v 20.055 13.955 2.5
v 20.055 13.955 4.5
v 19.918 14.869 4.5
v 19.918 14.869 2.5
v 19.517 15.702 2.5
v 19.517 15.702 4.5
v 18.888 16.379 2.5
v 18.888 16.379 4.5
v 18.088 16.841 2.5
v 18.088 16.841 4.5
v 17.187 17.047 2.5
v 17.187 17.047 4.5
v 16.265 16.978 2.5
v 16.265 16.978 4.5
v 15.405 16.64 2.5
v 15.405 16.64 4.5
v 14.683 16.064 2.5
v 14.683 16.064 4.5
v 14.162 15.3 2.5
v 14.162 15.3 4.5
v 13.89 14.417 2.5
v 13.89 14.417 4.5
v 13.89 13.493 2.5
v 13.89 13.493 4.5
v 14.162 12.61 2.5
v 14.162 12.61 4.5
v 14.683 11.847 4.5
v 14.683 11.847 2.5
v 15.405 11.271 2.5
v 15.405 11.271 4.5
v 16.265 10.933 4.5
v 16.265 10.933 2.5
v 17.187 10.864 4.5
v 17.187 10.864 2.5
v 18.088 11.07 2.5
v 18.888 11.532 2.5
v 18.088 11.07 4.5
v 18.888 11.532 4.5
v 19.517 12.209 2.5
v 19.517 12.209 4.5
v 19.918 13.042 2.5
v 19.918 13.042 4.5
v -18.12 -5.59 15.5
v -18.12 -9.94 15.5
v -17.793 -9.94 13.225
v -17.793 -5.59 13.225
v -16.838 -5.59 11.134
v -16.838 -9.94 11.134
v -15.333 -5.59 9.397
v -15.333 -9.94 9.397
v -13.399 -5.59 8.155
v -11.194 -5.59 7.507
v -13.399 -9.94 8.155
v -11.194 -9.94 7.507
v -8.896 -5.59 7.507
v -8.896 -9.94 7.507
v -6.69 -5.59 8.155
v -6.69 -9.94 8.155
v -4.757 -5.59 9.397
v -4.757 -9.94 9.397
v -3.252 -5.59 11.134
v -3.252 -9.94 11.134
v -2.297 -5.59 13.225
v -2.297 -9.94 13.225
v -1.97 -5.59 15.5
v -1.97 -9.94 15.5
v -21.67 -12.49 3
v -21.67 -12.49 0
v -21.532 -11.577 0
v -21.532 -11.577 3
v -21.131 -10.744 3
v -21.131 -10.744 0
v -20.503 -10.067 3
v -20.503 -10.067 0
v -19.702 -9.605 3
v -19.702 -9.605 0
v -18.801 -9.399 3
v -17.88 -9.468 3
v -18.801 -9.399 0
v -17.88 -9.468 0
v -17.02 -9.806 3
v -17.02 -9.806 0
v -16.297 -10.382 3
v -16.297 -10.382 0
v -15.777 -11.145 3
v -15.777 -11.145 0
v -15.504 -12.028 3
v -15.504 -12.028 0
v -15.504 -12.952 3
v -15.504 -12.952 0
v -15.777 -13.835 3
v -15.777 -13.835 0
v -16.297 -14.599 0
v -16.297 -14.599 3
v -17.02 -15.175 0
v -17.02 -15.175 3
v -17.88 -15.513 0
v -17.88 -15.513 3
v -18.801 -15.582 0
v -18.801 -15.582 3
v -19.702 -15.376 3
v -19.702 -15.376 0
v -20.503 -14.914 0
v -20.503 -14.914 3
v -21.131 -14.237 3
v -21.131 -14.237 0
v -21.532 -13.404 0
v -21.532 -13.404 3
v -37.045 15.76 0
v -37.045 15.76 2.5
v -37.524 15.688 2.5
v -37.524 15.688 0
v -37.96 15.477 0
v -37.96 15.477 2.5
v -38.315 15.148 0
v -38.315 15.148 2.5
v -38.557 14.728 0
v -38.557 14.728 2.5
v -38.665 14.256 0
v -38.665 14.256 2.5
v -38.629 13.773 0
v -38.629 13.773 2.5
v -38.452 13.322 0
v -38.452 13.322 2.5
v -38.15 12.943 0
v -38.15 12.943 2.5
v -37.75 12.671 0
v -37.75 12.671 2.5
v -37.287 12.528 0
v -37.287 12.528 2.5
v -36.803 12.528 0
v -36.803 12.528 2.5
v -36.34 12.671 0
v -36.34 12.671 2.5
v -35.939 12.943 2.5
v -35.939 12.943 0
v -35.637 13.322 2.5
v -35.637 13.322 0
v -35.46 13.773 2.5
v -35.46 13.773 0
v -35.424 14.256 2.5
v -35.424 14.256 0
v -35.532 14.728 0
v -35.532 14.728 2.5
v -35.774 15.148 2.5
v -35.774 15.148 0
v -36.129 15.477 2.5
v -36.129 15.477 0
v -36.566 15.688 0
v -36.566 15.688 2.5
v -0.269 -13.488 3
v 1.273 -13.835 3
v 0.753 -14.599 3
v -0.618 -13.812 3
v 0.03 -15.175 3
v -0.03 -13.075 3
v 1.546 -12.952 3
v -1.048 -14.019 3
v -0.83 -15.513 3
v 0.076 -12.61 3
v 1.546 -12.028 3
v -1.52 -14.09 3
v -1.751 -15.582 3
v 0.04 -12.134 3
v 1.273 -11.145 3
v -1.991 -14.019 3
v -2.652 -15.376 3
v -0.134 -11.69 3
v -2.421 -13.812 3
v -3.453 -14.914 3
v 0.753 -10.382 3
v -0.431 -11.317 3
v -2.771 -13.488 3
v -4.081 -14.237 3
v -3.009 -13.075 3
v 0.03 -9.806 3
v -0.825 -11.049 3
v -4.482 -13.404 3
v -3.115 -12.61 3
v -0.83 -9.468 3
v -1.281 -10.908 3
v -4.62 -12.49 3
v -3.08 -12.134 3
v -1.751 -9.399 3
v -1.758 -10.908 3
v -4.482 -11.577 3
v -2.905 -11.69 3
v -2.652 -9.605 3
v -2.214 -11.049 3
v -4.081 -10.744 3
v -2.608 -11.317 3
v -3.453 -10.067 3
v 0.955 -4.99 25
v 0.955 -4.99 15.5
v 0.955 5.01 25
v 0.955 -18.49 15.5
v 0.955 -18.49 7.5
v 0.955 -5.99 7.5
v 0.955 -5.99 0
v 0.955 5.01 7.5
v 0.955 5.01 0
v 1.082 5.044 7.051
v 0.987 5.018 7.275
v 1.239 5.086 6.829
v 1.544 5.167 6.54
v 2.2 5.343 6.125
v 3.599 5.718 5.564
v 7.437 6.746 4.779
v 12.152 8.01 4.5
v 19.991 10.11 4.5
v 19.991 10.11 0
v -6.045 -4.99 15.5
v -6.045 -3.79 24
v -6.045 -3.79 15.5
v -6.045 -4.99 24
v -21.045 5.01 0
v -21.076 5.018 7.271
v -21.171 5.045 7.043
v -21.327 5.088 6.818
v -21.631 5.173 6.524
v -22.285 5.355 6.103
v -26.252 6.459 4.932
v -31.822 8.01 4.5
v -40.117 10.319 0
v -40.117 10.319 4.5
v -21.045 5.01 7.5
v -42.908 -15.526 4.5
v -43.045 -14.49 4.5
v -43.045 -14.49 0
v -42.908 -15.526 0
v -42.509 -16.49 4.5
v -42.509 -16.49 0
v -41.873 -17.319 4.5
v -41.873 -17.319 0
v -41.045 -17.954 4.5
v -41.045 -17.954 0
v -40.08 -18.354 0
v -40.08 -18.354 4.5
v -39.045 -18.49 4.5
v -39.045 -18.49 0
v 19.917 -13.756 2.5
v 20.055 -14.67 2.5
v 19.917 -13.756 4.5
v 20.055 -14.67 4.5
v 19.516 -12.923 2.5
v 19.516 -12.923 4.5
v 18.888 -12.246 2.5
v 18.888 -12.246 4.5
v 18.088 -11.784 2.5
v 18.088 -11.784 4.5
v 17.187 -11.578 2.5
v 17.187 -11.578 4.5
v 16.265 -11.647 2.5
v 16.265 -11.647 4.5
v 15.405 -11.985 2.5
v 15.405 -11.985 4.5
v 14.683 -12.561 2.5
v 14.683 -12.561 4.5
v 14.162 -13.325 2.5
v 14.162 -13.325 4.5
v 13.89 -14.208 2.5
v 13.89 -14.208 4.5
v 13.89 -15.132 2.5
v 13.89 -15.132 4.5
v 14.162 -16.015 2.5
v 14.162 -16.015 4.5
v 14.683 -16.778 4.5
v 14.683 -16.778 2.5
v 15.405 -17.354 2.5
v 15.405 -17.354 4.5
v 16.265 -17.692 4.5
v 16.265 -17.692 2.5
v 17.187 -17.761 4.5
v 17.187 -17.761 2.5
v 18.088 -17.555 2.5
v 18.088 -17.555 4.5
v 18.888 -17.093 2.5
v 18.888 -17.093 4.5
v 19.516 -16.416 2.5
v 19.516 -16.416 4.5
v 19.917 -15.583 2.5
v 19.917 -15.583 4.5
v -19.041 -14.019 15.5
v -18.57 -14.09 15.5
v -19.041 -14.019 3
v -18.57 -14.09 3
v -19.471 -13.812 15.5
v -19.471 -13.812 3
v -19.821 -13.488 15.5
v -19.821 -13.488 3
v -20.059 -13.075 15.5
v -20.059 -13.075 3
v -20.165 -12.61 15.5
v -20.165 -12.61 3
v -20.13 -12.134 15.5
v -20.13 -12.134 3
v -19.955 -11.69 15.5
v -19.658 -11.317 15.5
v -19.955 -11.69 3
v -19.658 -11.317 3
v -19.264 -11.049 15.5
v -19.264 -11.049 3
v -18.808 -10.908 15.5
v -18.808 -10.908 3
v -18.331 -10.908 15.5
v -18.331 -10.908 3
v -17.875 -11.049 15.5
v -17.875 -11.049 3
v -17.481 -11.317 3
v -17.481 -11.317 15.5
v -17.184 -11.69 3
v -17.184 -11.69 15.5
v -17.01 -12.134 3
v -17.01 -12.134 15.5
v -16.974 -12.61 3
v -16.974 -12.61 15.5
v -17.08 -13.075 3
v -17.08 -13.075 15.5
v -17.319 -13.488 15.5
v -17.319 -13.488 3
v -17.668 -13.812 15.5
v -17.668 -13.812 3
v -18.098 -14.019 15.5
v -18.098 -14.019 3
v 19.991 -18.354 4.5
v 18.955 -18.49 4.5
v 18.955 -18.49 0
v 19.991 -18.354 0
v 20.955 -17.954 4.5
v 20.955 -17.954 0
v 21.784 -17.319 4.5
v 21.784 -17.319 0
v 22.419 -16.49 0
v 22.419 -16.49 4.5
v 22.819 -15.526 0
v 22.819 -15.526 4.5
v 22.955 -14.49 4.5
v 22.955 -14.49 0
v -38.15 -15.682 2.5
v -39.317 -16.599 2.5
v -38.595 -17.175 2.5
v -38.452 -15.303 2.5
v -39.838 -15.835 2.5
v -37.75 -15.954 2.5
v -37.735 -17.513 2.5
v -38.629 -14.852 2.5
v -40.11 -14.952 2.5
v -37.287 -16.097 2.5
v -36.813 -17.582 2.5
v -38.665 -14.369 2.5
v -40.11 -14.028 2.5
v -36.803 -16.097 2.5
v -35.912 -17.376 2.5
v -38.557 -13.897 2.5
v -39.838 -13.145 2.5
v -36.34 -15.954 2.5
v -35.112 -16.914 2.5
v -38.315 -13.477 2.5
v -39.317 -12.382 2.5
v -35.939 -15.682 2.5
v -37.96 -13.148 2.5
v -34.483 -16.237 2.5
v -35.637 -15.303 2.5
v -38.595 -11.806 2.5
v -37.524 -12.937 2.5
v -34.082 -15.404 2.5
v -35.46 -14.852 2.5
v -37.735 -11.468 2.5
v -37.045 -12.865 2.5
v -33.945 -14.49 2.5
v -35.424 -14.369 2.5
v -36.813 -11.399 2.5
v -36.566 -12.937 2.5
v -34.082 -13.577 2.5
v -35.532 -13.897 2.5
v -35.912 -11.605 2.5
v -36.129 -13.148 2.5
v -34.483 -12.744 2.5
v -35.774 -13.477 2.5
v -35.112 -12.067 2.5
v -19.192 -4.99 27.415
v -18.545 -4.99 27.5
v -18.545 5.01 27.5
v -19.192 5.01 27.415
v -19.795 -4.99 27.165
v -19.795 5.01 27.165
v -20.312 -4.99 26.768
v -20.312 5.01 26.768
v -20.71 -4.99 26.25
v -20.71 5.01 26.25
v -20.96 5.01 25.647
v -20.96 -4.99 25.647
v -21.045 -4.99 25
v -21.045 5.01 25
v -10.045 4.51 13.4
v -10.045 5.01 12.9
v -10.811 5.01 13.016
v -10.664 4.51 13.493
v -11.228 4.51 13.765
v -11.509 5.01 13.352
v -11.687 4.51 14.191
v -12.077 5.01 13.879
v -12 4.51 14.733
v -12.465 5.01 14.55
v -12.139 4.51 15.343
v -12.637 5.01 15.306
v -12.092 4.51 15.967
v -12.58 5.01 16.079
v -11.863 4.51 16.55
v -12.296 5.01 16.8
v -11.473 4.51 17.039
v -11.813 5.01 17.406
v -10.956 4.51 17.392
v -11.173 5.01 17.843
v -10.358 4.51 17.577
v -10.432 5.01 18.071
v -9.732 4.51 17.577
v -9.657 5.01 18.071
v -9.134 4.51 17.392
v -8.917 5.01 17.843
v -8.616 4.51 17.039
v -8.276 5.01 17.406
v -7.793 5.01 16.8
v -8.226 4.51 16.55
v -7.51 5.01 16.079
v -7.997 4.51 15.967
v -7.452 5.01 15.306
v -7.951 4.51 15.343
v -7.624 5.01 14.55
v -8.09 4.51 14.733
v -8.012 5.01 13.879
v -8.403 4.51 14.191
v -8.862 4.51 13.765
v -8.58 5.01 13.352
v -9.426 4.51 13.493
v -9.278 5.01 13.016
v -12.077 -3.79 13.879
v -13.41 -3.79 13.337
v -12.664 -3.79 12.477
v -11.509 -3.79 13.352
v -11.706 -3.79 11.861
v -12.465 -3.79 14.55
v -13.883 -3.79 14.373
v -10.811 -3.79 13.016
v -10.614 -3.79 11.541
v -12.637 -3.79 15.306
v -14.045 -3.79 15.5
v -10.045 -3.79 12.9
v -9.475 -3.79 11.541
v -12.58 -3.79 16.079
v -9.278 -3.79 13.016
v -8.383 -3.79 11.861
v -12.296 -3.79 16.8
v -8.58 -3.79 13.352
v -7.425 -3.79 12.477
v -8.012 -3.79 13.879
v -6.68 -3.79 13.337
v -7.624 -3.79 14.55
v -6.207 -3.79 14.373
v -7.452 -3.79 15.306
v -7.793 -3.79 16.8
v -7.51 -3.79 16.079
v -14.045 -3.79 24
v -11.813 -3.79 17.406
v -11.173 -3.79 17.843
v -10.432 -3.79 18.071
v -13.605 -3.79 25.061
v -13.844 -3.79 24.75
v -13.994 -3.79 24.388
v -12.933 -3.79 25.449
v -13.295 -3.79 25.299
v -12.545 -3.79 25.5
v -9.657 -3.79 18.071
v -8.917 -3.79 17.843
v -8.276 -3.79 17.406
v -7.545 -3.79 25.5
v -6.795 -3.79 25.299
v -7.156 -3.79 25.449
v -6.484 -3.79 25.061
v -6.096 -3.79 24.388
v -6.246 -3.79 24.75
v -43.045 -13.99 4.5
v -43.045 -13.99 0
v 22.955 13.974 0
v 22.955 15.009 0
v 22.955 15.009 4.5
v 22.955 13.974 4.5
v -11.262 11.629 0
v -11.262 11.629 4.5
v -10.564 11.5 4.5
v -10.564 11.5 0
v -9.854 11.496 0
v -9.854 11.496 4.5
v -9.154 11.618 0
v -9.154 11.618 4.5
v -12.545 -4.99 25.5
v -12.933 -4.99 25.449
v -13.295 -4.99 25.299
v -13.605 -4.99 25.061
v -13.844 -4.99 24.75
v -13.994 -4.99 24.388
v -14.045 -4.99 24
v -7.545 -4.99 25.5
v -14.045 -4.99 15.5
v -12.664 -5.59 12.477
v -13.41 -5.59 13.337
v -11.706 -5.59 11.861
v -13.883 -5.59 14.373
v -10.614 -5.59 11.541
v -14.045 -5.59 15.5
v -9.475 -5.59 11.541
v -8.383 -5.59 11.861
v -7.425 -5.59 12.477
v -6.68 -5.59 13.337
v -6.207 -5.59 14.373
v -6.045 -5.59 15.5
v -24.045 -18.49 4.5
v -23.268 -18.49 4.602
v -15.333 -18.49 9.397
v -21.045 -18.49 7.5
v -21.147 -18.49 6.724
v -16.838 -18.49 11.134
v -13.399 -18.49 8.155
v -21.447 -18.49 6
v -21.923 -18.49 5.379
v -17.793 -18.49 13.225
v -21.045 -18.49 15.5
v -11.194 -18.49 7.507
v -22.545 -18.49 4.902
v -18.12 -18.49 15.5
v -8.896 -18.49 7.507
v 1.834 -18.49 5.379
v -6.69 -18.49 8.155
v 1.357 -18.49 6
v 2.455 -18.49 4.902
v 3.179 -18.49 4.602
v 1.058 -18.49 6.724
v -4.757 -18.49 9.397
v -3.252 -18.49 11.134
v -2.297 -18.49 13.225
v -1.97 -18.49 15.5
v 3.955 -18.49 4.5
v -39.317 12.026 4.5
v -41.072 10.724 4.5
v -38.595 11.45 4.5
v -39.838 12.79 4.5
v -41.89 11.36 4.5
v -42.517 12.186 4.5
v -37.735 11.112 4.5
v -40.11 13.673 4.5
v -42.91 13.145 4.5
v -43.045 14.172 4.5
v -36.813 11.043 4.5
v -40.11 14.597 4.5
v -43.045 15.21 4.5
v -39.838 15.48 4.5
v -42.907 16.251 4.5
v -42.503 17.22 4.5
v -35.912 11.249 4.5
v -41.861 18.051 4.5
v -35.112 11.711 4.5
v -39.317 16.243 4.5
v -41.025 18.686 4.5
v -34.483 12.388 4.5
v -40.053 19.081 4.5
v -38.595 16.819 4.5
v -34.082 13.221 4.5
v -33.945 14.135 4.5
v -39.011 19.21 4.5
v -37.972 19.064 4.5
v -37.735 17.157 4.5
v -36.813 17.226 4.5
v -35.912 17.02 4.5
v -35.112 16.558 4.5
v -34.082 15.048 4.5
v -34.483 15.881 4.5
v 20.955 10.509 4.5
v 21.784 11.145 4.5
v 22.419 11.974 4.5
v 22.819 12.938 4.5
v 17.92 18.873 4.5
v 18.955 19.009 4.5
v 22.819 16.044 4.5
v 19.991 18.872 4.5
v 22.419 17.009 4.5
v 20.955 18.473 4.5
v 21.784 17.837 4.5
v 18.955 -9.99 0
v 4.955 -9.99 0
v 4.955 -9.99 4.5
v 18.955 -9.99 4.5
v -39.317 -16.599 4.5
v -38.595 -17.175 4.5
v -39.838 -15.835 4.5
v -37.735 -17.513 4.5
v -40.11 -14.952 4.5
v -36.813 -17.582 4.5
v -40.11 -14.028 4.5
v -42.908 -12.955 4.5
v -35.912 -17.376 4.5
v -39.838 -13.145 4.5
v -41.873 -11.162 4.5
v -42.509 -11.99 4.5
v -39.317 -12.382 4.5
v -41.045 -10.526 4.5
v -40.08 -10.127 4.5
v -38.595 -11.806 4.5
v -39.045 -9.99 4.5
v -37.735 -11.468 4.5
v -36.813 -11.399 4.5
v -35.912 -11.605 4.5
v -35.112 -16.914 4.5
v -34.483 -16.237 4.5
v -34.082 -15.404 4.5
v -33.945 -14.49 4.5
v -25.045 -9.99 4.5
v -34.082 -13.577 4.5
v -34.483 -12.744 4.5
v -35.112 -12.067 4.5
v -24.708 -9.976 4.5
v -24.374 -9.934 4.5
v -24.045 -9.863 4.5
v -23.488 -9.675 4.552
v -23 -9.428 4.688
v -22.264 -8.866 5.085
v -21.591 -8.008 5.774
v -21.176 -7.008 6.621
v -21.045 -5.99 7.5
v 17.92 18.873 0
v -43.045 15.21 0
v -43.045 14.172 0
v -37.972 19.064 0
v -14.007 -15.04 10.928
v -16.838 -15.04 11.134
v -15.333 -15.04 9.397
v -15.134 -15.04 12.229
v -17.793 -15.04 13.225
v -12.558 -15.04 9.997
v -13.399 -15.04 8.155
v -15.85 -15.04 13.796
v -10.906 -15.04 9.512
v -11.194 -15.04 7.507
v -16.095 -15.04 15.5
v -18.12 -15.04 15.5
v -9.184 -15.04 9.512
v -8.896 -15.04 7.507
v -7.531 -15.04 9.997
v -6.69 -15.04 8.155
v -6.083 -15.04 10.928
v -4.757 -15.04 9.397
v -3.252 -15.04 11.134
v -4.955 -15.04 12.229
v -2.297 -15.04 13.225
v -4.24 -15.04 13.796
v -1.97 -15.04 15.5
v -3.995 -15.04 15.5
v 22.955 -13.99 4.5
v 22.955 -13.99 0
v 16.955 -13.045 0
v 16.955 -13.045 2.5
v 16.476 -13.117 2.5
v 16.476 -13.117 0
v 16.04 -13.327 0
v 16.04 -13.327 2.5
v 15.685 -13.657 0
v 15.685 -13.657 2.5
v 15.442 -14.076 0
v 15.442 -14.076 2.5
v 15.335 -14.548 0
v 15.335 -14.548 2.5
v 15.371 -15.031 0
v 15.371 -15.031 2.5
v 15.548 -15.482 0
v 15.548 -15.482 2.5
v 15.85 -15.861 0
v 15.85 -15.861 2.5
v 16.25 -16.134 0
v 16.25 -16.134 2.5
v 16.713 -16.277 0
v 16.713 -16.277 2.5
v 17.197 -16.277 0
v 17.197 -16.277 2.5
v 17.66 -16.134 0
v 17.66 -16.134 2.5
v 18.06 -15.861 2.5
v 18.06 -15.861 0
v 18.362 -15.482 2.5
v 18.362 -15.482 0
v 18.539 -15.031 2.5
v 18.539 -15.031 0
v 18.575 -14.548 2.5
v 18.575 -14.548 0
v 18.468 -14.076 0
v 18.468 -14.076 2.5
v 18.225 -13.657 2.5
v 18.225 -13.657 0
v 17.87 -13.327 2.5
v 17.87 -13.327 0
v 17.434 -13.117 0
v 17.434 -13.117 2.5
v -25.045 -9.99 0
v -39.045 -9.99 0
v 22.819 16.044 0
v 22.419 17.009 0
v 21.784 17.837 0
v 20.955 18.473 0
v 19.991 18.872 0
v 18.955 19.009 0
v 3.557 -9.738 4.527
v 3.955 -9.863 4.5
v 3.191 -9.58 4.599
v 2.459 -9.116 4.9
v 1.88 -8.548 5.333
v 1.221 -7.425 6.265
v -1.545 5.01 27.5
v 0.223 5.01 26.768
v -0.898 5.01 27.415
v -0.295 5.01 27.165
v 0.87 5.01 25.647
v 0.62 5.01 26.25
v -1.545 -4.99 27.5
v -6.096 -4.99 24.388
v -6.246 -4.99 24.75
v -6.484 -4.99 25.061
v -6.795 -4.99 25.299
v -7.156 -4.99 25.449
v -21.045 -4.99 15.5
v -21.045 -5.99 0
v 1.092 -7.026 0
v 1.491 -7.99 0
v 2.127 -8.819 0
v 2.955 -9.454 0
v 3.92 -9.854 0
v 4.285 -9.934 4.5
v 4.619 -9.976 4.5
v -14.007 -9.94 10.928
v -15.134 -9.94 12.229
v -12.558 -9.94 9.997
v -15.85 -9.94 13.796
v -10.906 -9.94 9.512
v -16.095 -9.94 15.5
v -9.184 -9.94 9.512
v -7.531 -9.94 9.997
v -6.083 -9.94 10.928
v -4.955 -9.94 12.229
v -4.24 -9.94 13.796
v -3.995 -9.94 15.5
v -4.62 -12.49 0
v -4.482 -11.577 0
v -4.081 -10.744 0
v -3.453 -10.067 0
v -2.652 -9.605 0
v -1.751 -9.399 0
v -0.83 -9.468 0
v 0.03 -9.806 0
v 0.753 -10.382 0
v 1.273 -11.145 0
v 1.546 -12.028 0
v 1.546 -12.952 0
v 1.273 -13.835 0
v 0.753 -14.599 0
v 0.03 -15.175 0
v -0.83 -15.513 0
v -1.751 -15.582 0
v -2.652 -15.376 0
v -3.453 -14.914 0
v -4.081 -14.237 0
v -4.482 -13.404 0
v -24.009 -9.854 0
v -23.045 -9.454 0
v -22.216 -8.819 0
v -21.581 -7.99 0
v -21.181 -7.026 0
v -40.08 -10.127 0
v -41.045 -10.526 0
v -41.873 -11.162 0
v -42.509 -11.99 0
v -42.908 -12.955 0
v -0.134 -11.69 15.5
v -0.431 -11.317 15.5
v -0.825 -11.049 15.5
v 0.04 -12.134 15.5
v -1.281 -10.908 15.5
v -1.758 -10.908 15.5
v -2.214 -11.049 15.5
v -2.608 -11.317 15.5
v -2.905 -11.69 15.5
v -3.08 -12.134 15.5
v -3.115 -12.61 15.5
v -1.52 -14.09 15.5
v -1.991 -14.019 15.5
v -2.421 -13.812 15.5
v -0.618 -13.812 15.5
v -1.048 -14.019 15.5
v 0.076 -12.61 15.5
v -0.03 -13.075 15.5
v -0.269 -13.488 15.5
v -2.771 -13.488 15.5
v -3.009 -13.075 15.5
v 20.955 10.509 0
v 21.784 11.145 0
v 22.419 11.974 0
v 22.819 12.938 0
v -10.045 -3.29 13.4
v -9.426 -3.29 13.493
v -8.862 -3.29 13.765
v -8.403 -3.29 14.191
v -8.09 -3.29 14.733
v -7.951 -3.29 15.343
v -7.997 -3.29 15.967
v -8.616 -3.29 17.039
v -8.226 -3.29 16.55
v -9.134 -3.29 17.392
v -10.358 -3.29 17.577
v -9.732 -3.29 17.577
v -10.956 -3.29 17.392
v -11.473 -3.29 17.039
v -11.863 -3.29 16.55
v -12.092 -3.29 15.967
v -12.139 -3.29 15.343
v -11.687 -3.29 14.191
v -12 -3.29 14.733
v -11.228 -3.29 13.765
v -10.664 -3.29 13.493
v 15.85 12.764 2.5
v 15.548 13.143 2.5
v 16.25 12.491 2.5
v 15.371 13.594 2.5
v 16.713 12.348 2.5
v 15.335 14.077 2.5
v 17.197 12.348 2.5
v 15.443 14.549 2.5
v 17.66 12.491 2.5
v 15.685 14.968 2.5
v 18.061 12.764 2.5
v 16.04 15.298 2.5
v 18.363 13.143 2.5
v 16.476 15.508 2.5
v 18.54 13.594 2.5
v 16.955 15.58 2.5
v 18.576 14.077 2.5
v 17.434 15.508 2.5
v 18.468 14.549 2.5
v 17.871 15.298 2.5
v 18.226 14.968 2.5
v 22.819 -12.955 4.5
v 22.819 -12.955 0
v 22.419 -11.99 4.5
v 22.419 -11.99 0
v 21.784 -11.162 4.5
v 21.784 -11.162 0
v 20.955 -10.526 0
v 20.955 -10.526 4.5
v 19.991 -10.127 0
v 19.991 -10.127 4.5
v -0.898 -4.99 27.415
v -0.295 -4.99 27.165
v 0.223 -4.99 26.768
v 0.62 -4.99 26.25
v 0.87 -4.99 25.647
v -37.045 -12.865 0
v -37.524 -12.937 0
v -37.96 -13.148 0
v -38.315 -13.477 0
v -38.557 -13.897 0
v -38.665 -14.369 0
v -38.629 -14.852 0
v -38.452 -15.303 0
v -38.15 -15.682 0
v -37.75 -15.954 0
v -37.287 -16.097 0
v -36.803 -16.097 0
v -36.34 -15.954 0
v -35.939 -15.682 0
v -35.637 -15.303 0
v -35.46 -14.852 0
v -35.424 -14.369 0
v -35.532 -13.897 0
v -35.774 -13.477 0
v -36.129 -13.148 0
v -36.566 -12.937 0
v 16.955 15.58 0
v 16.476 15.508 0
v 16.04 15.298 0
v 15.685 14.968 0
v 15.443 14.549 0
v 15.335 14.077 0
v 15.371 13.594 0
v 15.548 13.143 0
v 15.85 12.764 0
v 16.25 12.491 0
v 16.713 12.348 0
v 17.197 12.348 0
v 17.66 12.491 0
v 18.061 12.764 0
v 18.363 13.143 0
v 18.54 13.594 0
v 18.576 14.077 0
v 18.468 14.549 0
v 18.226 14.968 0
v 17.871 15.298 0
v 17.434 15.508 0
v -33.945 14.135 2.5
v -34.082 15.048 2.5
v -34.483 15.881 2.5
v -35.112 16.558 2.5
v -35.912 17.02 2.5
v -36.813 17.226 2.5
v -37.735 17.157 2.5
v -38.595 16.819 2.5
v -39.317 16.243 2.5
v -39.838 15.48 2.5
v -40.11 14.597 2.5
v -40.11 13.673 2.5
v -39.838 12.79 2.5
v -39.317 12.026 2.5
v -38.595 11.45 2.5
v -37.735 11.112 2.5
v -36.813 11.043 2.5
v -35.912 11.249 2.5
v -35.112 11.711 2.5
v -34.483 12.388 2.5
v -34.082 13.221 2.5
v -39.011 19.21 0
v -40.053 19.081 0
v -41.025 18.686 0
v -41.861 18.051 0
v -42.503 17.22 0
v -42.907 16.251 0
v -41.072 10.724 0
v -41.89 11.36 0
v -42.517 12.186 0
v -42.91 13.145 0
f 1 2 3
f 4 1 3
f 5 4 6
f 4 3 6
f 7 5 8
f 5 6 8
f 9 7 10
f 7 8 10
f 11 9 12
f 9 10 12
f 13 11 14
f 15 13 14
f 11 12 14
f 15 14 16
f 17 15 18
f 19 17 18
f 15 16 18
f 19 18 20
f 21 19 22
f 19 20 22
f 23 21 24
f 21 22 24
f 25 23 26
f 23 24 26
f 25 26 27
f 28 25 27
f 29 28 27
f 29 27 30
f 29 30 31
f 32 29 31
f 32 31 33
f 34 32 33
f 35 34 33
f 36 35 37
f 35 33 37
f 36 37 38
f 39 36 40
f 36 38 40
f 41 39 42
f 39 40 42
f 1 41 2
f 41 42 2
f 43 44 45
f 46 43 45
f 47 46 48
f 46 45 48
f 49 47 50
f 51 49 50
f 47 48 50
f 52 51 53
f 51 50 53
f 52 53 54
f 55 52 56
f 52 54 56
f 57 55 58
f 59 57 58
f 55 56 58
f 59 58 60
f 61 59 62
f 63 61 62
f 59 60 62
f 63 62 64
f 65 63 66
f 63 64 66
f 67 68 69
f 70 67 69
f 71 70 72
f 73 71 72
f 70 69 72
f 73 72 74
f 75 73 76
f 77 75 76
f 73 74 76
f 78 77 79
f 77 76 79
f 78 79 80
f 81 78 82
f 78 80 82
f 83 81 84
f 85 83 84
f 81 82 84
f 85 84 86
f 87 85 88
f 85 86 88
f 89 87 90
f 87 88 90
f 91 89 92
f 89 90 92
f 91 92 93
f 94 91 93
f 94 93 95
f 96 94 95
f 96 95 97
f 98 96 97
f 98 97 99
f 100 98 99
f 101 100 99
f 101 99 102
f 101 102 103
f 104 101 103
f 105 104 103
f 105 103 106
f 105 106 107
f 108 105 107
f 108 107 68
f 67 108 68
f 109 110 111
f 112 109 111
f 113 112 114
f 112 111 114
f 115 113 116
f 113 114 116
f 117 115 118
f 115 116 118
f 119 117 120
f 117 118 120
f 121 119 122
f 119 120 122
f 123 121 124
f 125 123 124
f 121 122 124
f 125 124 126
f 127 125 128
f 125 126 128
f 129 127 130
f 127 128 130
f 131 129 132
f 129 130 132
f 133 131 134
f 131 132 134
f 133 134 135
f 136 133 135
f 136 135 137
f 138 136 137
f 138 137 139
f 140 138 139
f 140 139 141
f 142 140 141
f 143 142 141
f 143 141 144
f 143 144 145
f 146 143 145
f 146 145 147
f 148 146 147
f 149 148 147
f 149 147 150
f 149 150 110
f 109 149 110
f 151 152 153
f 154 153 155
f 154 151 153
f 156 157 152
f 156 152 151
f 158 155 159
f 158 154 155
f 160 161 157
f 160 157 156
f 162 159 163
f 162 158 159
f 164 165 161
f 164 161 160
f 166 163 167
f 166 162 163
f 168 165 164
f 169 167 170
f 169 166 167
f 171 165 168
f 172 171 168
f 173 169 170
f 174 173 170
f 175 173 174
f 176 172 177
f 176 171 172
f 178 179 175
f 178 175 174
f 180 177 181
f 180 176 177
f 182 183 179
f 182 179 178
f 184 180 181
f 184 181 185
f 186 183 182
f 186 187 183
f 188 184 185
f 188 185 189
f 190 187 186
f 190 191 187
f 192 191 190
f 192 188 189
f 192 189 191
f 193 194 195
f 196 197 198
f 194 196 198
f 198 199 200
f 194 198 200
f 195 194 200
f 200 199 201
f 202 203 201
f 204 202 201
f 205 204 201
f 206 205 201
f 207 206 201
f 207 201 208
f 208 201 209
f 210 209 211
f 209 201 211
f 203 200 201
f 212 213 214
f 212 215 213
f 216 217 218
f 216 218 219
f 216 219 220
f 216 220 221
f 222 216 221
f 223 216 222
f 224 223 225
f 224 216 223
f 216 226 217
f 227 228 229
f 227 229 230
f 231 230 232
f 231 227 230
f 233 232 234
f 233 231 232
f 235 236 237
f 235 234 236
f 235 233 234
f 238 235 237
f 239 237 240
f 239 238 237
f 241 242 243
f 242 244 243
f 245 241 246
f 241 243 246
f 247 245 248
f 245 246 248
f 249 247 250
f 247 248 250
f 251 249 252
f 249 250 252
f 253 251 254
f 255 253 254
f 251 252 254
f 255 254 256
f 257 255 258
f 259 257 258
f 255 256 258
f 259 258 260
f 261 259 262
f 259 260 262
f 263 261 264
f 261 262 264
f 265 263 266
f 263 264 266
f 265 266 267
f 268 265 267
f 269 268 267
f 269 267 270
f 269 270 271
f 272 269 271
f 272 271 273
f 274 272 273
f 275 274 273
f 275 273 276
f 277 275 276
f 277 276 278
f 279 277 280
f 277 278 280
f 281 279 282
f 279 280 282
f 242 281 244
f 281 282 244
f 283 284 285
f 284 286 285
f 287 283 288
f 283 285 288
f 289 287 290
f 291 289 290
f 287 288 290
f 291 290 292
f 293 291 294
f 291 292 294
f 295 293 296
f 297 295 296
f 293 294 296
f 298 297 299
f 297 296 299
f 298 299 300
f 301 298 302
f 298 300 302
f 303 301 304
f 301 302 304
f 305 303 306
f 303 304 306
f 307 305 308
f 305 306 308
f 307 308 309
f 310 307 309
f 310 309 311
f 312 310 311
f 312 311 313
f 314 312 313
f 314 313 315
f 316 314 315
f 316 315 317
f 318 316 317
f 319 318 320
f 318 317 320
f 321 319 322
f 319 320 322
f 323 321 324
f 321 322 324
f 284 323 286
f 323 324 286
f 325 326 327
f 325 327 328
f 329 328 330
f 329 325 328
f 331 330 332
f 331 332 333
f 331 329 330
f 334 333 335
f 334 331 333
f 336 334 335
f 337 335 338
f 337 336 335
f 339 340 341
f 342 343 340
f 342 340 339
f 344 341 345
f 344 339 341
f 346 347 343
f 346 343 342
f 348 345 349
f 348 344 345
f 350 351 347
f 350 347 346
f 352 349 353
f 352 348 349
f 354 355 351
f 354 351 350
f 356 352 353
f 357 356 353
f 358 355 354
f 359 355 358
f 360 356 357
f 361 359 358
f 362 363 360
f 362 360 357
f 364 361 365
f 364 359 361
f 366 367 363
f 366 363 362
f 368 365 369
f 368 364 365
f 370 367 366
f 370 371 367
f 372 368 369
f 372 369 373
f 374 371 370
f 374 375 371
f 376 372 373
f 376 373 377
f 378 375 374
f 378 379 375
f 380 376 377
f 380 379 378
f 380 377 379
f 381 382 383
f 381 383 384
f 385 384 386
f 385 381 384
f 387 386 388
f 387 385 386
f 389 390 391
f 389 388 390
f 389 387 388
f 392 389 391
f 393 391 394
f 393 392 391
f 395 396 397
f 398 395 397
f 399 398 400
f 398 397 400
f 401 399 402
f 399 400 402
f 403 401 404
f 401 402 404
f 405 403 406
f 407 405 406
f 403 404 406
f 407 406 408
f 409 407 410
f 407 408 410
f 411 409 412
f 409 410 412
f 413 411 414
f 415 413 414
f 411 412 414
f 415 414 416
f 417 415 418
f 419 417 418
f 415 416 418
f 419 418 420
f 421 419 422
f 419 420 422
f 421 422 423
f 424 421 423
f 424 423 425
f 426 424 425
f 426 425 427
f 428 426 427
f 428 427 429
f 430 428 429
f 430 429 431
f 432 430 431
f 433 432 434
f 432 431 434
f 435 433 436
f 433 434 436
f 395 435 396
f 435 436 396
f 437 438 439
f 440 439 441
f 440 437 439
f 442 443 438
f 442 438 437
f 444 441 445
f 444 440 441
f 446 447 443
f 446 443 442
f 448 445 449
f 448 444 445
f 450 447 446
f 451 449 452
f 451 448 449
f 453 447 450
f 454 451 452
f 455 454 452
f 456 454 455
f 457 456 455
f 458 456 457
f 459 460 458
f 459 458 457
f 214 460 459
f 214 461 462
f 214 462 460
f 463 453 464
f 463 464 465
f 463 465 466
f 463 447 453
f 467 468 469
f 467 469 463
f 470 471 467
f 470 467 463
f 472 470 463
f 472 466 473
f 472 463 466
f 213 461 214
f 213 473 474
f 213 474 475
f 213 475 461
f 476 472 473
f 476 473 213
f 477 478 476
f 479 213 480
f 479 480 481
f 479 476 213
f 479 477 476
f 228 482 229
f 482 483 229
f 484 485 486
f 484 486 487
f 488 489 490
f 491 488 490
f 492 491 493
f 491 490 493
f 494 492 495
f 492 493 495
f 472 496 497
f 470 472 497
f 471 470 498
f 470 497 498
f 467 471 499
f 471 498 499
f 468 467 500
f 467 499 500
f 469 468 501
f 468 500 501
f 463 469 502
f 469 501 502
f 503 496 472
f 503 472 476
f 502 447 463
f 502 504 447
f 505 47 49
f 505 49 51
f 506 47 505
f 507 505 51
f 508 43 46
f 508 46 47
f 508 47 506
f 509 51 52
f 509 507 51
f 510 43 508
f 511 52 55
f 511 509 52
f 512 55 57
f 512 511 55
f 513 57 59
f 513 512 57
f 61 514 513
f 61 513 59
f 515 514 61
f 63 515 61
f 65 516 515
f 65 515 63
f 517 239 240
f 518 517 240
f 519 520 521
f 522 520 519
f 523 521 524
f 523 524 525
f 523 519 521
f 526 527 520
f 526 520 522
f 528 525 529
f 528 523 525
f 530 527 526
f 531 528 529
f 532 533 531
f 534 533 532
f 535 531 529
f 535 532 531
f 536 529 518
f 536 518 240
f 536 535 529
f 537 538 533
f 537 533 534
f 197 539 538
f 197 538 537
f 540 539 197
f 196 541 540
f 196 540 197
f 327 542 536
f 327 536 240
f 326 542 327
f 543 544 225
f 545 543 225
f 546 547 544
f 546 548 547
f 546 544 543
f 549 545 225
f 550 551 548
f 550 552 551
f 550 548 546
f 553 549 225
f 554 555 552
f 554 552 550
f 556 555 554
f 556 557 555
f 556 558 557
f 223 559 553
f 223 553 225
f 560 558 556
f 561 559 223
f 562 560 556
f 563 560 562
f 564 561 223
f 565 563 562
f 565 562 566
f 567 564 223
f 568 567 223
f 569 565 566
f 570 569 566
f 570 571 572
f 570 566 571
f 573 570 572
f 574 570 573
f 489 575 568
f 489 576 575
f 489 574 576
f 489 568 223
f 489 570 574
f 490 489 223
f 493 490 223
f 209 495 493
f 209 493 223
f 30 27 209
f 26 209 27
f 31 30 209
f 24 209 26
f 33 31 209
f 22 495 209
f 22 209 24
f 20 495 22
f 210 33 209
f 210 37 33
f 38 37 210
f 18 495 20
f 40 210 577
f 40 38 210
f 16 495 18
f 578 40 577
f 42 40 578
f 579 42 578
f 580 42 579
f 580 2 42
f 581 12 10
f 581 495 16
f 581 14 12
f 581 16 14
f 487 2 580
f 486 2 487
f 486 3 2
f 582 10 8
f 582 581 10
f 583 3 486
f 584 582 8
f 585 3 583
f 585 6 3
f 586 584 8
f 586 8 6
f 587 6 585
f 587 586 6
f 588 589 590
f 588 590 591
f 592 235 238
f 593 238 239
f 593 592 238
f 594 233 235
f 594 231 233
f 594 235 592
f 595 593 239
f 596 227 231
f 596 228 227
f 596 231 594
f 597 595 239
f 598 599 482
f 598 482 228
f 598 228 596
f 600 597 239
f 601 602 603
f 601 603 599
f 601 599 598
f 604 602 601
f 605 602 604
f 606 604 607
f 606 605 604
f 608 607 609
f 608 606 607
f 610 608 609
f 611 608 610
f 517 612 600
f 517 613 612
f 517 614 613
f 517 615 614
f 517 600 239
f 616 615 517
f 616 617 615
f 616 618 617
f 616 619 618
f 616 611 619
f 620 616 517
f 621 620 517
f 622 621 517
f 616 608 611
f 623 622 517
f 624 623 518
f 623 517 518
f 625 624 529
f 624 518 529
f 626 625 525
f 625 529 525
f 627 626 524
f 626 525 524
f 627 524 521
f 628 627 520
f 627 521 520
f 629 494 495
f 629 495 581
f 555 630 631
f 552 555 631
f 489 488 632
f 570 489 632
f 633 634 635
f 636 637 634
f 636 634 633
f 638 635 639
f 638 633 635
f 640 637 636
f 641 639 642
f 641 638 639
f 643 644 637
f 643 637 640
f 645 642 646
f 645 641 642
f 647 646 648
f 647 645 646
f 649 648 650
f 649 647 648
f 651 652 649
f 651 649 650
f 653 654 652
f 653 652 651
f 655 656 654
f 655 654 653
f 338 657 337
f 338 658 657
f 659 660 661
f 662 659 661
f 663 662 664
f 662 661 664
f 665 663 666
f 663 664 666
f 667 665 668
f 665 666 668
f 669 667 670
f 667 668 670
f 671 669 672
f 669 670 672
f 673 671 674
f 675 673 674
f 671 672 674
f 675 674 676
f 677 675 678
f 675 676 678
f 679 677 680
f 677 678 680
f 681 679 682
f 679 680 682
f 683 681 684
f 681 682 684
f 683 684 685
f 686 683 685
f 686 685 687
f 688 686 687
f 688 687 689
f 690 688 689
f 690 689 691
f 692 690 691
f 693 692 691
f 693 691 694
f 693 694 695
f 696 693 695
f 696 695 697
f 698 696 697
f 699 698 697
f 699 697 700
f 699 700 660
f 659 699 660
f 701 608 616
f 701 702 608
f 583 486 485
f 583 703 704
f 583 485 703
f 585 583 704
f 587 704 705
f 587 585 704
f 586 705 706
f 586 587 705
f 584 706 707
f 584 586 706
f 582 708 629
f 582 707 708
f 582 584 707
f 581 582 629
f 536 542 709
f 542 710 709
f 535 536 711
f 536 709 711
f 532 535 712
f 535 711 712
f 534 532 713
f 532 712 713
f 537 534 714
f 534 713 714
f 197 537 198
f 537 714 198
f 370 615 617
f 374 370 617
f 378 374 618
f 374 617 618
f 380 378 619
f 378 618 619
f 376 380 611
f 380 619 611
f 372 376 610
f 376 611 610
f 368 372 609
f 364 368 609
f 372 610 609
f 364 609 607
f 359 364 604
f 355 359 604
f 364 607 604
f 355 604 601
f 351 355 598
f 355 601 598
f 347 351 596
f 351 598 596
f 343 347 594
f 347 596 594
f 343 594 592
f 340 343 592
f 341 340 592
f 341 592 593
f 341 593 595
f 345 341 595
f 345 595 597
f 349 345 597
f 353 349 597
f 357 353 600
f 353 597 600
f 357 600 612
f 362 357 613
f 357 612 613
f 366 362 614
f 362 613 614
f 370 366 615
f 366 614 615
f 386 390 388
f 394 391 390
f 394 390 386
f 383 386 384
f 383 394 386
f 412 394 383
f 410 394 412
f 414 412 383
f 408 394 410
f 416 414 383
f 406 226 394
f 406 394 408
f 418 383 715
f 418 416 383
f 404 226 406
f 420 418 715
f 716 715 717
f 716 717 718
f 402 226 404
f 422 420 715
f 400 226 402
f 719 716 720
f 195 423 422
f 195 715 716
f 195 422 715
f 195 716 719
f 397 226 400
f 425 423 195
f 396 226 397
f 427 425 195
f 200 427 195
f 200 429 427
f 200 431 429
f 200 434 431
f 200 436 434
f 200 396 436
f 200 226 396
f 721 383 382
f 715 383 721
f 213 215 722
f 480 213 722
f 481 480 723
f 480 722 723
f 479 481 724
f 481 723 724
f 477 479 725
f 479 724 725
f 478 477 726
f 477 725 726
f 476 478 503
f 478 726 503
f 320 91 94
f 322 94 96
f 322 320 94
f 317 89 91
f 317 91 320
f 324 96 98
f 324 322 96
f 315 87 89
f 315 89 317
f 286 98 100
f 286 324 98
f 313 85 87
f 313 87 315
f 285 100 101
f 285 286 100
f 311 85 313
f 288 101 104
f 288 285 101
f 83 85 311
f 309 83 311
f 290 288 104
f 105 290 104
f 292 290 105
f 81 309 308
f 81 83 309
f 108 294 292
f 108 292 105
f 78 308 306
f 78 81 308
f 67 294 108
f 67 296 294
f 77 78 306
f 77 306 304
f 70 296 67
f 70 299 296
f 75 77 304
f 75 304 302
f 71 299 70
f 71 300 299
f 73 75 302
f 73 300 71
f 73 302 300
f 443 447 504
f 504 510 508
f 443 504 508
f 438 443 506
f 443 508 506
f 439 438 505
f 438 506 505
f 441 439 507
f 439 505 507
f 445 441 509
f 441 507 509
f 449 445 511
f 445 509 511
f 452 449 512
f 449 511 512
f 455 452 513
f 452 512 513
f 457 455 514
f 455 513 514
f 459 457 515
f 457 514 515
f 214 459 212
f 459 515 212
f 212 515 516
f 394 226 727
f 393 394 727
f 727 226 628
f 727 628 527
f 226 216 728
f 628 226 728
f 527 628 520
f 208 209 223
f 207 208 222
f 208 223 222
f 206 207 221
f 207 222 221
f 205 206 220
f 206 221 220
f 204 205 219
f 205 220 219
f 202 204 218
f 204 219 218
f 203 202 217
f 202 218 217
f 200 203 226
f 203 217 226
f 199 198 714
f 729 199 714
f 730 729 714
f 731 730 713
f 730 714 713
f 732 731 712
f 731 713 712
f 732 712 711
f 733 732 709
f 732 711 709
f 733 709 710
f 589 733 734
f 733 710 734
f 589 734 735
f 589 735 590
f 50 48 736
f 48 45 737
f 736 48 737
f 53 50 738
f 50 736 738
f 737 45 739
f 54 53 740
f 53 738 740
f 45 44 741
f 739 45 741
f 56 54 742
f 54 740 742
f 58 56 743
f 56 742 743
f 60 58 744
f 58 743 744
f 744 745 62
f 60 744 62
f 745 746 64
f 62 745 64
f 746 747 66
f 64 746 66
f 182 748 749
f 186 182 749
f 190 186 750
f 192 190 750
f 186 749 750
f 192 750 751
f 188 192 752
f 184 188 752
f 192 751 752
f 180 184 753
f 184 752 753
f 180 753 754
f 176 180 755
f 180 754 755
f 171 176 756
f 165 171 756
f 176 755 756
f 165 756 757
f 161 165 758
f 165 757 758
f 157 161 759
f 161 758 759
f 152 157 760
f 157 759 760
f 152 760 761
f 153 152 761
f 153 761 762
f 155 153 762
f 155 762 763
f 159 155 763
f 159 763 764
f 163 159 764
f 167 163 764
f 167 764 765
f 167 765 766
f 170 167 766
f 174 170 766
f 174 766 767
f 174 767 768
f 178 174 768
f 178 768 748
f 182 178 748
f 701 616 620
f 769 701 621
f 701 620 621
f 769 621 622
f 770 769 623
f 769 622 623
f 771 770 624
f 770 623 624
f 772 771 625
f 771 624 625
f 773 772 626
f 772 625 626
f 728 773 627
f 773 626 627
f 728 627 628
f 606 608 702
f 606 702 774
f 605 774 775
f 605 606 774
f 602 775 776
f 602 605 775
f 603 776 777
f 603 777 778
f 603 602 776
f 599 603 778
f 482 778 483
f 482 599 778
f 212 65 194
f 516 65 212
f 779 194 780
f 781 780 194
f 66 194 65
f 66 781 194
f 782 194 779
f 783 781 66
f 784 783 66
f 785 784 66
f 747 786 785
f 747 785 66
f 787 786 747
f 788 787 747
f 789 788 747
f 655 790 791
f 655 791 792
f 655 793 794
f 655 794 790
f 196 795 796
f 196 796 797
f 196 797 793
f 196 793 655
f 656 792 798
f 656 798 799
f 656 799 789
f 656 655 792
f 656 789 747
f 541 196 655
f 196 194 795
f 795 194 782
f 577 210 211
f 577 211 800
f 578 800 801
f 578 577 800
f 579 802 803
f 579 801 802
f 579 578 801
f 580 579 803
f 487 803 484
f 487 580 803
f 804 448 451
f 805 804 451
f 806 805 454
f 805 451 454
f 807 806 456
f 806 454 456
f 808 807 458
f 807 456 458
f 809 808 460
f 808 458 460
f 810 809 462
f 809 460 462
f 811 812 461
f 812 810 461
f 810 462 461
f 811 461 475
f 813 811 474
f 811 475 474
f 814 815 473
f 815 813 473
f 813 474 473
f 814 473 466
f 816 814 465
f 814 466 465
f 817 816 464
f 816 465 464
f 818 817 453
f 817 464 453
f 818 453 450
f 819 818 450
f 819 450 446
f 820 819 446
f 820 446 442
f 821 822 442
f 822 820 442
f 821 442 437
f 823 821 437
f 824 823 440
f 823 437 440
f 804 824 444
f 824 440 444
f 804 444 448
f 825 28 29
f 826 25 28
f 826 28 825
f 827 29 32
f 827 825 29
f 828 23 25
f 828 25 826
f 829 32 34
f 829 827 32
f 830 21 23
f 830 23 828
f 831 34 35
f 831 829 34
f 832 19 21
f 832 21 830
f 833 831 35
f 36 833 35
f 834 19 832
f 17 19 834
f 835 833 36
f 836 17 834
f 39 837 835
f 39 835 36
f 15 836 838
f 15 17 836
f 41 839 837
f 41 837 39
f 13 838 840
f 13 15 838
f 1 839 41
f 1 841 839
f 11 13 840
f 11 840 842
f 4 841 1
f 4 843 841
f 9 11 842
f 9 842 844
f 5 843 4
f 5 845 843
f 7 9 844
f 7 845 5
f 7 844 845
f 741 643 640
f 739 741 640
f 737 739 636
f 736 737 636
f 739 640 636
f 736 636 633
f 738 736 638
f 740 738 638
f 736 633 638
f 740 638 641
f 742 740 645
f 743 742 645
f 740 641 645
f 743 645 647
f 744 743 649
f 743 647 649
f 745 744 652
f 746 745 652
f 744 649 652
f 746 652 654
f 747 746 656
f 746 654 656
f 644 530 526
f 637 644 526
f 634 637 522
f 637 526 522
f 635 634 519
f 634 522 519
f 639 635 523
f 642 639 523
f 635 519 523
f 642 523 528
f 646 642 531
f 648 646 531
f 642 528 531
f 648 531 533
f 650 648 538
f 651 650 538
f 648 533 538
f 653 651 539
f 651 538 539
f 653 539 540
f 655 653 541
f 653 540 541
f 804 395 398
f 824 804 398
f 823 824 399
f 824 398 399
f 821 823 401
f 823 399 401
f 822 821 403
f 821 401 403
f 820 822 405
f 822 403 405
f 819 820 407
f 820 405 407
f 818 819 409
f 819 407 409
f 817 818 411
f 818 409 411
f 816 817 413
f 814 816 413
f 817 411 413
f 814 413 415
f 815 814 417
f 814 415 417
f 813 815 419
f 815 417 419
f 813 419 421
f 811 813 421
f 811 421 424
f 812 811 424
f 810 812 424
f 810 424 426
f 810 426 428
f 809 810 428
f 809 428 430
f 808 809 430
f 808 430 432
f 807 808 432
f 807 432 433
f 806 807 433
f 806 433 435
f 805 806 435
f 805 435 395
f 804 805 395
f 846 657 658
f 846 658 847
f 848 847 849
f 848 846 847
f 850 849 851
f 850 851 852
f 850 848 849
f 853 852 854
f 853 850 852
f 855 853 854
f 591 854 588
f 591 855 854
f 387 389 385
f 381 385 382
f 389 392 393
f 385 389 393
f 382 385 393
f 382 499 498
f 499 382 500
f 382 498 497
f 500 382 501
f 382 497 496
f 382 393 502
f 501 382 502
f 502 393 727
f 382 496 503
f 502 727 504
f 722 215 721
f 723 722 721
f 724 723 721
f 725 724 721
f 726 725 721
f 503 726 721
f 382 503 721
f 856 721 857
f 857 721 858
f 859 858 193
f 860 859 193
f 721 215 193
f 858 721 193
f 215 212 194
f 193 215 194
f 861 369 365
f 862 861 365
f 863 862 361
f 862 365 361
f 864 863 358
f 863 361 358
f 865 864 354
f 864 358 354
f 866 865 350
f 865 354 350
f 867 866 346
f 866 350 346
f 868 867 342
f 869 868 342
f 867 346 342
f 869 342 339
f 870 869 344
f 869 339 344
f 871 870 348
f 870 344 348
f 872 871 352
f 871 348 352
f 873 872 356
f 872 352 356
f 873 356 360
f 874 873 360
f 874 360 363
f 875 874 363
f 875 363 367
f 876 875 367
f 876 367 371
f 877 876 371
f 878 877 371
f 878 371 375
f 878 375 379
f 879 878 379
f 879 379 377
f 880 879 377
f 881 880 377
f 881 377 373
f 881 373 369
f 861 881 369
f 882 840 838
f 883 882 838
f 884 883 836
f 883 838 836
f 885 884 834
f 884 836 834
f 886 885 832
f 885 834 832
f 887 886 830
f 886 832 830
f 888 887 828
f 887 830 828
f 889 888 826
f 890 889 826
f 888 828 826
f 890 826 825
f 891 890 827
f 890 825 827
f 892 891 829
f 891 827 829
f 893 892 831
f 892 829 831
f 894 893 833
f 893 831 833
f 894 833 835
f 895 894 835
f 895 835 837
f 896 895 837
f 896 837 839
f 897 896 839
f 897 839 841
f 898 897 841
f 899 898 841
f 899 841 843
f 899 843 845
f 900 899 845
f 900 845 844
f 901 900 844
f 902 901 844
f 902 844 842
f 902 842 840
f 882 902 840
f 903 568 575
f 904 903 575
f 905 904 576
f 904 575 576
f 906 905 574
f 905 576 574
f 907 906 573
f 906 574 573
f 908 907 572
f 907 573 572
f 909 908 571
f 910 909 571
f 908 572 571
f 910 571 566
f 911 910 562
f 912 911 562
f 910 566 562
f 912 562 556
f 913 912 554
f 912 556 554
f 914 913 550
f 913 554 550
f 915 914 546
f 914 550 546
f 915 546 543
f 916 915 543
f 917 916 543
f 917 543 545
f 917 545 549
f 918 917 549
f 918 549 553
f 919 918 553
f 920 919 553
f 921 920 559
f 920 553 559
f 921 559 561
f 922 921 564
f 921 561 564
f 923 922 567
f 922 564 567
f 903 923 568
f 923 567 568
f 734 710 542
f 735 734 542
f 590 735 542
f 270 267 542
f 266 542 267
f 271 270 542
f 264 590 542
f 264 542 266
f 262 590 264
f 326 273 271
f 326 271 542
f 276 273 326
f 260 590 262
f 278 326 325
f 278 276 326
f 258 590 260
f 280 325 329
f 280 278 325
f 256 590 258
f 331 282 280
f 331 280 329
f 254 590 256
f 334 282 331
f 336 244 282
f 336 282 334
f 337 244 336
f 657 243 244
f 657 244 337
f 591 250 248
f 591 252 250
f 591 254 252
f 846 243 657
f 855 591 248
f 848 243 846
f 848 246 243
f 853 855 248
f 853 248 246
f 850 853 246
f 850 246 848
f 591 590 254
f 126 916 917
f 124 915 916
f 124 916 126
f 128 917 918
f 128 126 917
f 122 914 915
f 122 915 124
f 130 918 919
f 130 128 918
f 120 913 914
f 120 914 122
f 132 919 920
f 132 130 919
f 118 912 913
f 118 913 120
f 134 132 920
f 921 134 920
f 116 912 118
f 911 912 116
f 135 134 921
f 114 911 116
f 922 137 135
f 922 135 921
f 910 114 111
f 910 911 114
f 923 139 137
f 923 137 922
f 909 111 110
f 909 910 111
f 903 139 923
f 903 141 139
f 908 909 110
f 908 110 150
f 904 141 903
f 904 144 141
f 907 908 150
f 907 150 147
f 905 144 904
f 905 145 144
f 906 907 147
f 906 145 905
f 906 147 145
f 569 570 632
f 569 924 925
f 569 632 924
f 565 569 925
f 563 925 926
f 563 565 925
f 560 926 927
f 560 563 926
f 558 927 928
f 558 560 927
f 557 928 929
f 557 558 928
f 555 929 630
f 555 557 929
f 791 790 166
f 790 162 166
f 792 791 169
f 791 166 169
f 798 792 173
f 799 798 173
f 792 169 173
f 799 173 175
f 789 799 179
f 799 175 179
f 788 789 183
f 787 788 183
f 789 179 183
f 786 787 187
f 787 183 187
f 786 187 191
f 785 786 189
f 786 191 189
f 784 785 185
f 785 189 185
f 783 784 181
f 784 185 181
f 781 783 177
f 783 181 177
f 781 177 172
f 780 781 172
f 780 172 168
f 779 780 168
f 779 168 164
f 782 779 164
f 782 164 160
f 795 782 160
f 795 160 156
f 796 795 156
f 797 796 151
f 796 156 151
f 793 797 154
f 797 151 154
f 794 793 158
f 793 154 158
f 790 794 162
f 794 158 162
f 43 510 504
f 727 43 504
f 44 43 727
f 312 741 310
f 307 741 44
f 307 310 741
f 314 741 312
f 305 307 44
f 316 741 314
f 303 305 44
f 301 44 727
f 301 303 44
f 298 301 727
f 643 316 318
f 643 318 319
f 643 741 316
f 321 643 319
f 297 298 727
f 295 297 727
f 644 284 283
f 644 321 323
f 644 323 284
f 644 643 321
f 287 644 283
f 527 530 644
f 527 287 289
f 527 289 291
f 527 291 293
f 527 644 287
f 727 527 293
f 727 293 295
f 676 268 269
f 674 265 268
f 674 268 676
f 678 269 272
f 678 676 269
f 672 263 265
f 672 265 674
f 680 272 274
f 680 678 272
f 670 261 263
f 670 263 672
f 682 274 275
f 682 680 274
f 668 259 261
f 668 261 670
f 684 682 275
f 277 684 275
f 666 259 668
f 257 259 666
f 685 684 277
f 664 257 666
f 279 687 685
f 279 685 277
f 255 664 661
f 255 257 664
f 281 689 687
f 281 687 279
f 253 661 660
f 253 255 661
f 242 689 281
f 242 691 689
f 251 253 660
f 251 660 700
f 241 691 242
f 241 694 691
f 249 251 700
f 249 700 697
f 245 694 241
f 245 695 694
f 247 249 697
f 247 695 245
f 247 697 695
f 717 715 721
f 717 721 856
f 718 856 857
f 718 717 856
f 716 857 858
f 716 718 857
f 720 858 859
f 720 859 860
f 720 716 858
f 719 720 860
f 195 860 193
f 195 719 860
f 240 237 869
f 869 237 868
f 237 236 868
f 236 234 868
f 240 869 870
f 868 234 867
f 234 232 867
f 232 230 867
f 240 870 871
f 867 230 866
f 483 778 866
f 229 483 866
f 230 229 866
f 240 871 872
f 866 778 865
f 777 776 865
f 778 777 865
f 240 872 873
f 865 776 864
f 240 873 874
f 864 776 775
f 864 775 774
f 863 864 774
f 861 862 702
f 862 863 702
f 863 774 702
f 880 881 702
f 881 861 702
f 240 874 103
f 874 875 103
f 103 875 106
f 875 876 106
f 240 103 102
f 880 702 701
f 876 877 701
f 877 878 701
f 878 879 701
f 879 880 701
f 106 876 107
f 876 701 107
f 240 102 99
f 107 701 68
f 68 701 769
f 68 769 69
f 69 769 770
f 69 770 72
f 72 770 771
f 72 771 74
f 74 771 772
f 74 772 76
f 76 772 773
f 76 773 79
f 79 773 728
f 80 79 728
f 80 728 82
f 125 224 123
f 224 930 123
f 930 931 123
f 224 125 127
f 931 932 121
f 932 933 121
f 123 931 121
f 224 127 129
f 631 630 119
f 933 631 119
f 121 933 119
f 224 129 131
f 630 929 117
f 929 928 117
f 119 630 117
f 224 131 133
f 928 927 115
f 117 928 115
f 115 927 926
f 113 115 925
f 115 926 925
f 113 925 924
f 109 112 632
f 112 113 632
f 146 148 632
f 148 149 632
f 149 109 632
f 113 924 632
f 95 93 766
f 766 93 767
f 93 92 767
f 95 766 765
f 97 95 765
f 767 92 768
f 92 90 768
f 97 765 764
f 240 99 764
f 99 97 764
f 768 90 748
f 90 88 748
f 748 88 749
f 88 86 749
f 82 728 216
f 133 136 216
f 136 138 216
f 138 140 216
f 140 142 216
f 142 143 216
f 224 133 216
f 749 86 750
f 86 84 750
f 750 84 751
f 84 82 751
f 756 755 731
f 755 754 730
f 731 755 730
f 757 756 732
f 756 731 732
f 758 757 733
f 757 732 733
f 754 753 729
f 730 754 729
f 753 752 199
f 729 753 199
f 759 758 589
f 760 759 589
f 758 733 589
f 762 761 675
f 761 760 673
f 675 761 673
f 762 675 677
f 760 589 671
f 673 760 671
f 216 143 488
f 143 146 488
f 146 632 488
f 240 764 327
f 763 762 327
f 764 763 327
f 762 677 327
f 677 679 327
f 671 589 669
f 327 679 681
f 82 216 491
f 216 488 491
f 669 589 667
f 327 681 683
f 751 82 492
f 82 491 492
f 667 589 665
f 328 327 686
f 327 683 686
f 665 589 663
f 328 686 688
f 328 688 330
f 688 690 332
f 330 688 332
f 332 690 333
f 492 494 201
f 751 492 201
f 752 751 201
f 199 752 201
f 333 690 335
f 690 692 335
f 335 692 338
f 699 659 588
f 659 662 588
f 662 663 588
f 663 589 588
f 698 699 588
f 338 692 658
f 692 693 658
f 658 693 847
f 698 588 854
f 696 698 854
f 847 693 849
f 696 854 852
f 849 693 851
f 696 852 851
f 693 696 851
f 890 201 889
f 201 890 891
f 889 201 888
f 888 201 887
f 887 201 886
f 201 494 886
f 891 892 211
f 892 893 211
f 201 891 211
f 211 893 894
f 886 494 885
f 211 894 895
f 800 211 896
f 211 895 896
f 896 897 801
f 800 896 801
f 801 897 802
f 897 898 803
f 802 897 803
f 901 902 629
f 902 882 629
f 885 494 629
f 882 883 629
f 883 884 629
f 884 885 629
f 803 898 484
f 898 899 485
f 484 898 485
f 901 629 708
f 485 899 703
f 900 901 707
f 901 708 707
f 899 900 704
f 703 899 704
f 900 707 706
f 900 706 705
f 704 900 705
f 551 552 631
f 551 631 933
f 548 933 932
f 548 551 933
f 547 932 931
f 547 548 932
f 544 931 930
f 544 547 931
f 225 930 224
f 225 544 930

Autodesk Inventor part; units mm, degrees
ref_plane "YZ Plane" through (0, 0, 0) normal (1, 0, 0) x (0, 1, 0)
ref_plane "XZ Plane" through (0, 0, 0) normal (0, 1, 0) x (-1, 0, 0)
ref_plane "XY Plane" through (0, 0, 0) normal (0, 0, 1) x (1, 0, 0)
sketch "Szkic1" plane through (0, 0, 0) normal (0, 0, 1) x (1, 0, 0)
  line L0 (-43.0447, 20.476) -> (-43.0447, -18.4903)
  line L1 (22.9553, 20.2216) -> (22.9553, -18.4903)
  line L2 (-21.0447, 5.0097) -> (-21.0447, -9.9903)
  line L3 (0.9553, 5.0097) -> (0.9553, -9.9903)
  line L4 (-43.0447, -18.4903) -> (22.9553, -18.4903)
  line L5 (-43.0447, -9.9903) -> (-21.0447, -9.9903)
  line L6 (0.9553, -9.9903) -> (22.9553, -9.9903)
  line L7 (-21.0447, 5.0097) -> (0.9553, 5.0097)
  line L8 (-21.0447, 5.0097) -> (-43.0447, 11.1338)
  line L9 (-10.2095, 11.3357) -> (-43.0447, 20.476)
  line L10 (0.9553, 5.0097) -> (22.9553, 10.9042)
  line L11 (-10.2095, 11.3357) -> (22.9553, 20.2216)
  point P0 (0, 0)
  point P1 (-37.0447, -14.4903)
  point P2 (16.955, -14.6697)
  point P3 (-37.0447, 14.1347)
  point P4 (16.9553, 13.9553)
  dimension "d0" = 66
  dimension "d1" = 54
  dimension "d2" = 6
  dimension "d3" = 54
  dimension "d4" = 6
  dimension "d5" = 28.625
  dimension "d6" = 22
  dimension "d7" = 22
  dimension "d8" = 4
  dimension "d10" = 23.5
  dimension "d11" = 4.5
  dimension "d12" = 9
  dimension "d13" = 28.625
  dimension "d14" = 4.5
  dimension "d15" = 9
extrude "Wyciągnięcie proste1" add sketch "Szkic1" along normal blind 4.5 contours L9 L11 L1 L10 L7 L8 L0 | L5 L2 L7 L3 L6 L1 L4 L0
hole "Otwór1" at (-37.0447, -14.4903, 0) at (16.955, -14.6697, 0) at (-37.0447, 14.1347, 0) at (16.9553, 13.9553, 0) direction (0, 0, 1) diameter 3.25 end through all
sketch "Szkic2" plane through (0, 0, 4.5) normal (0, 0, 1) x (1, 0, 0)
  line L0 (-21.0447, 5.0097) -> (-21.0447, -9.9903) projected
  line L1 (-21.0447, 5.0097) -> (0.7211, 5.0097)
  circle A0 centre (-37.0447, 14.1347) radius 1.625 projected
  circle A1 centre (-37.0447, -14.4903) radius 1.625 projected
  circle A2 centre (16.955, -14.6697) radius 1.625 projected
  circle A3 centre (16.9553, 13.9553) radius 1.625 projected
  line L2 (-43.0447, 20.476) -> (-43.0447, 11.1338) projected
  line L3 (-43.0447, 11.1338) -> (-21.0447, 5.0097) projected
  line L4 (-21.0447, 5.0097) -> (-21.0447, -9.9903) projected
  line L5 (-21.0447, -9.9903) -> (-43.0447, -9.9903) projected
  line L6 (-43.0447, -9.9903) -> (-43.0447, -18.4903) projected
  line L7 (-43.0447, -18.4903) -> (22.9553, -18.4903) projected
  line L8 (22.9553, -18.4903) -> (22.9553, -9.9903) projected
  line L9 (22.9553, -9.9903) -> (0.9553, -9.9903) projected
  line L10 (0.9553, -9.9903) -> (0.9553, 5.0097) projected
  line L11 (0.9553, 5.0097) -> (22.9553, 10.9042) projected
  line L12 (22.9553, 10.9042) -> (22.9553, 20.2216) projected
  line L13 (22.9553, 20.2216) -> (-10.2095, 11.3357) projected
  line L14 (-10.2095, 11.3357) -> (-43.0447, 20.476) projected
  line L15 (-21.0447, -4.9903) -> (0.9553, -4.9903)
  line L16 (-43.0447, -18.4903) -> (22.9553, -18.4903) projected
  line L17 (-21.0447, -4.9903) -> (0.9553, -4.9903)
  line L18 (0.9553, -4.9903) -> (0.9553, -18.4903)
  line L19 (0.9553, -18.4903) -> (-21.0447, -18.4903)
  line L20 (-21.0447, -18.4903) -> (-21.0447, -4.9903)
  line L21 (-21.0447, 5.0097) -> (0.9553, 5.0097)
  line L22 (0.9553, 5.0097) -> (0.9553, -4.9903)
  line L23 (0.9553, -4.9903) -> (-21.0447, -4.9903)
  line L24 (-21.0447, -4.9903) -> (-21.0447, 5.0097)
  circle A4 centre (-37.0447, 14.1347) radius 3.1
  circle A5 centre (16.9553, 13.9553) radius 3.1
  circle A6 centre (16.955, -14.6697) radius 3.1
  circle A7 centre (-37.0447, -14.4903) radius 3.1
  point P0 (0, 0)
  dimension "d25" = 13.5
  dimension "d31" = 6.2
  dimension "d32" = 6.2
  dimension "d33" = 6.2
  dimension "d34" = 6.2
extrude "Wyciągnięcie proste2" add sketch "Szkic2" along normal blind 11 contours L15 L10 L18 L7 L20 L0
extrude "Wyciągnięcie proste3" add sketch "Szkic2" along normal blind 23 contours L1 L21 L10 L15 L0
fillet "Zaokrąglenie1" radius 4 11 edges at (22.9553, 10.9042, 2.25) (22.9553, 20.2216, 2.25) (-10.2095, 11.3357, 2.25) (-43.0447, 20.476, 2.25) (-43.0447, 11.1338, 2.25) (0.9553, -9.9903, 2.25) (22.9553, -9.9903, 2.25) (22.9553, -18.4903, 2.25) (-43.0447, -18.4903, 2.25) (-43.0447, -9.9903, 2.25) (-21.0447, -9.9903, 2.25)
extrude "Wyciągnięcie proste4" cut sketch "Szkic2" against normal blind 2 contours A4 | A5 | A6 | A7
fillet "Zaokrąglenie2" radius 3 3 edges at (-10.0447, 5.0097, 4.5) (-21.0447, -12.2403, 4.5) (0.9553, -12.2403, 4.5)
fillet "Zaokrąglenie3" radius 2.5 2 edges at (-21.0447, 0.0097, 27.5) (0.9553, 0.0097, 27.5)
sketch "Szkic3" plane through (-21.0447, -18.4903, 15.5) normal (0, -1, 0) x (1, 0, 0)
  line L0 (22, 0) -> (0, 0) projected
  line L1 (0, -8) -> (0, 0) projected
  arc A0 (2.925, 0) -> (19.075, 0) centre (11, 0) ccw
  arc A1 (4.95, 0) -> (17.05, 0) centre (11, 0) ccw
  point P0 (21.0447, -15.5)
  dimension "d39" = 11
  dimension "d48" = 16.15
  dimension "d51" = 12.1
hole "Otwór2" at (-10.0447, -18.4903, 15.5) direction (0, 1, 0) diameter 4.2 end through all
extrude "Wyciągnięcie proste5" cut sketch "Szkic3" against normal blind 12.9
extrude "Wyciągnięcie proste6" add sketch "Szkic3" against normal blind 8.55 contours A0 L0 A1
extrude "Wyciągnięcie proste7" cut sketch "Szkic3" against normal blind 3.45 contours A0 L0 A1
sketch "Szkic4" plane through (0, 0, 15.5) normal (0, 0, 1) x (1, 0, 0)
  line L0 (-3.9947, -15.0403) -> (-1.9697, -15.0403) projected
  line L1 (-3.9947, -9.9403) -> (-1.9697, -9.9403) projected
  line L2 (0.9553, -18.4903) -> (0.9553, -4.9903) projected
  line L3 (-3.9947, -15.0403) -> (-3.9947, -9.9403) projected
  line L4 (-18.1197, -9.9403) -> (-16.0947, -9.9403) projected
  line L5 (-21.0447, -4.9903) -> (-21.0447, -18.4903) projected
  point P0 (0, 0)
  point P1 (-18.5697, -12.4903)
  point P2 (-1.5197, -12.4903)
  dimension "d56" = 5.1
  dimension "d57" = 4.95
  dimension "d58" = 2.475
  dimension "d59" = 2.55
  dimension "d60" = 2.55
  dimension "d61" = 2.475
hole "Otwór3" at (-18.5697, -12.4903, 15.5) at (-1.5197, -12.4903, 15.5) direction (0, 0, -1) diameter 3.2 end through all
sketch "Szkic5" plane through (0, 0, 0) normal (0, 0, -1) x (-1, 0, 0)
  circle A0 centre (18.5697, -12.4903) radius 1.6 projected
  circle A1 centre (1.5197, -12.4903) radius 1.6 projected
  circle A2 centre (18.5697, -12.4903) radius 3.1
  circle A3 centre (1.5197, -12.4903) radius 3.1
  point P0 (0, 0)
  dimension "d69" = 6.2
  dimension "d70" = 6.2
extrude "Wyciągnięcie proste8" cut sketch "Szkic5" against normal blind 3
sketch "Szkic6" plane through (-21.0447, -5.5903, 15.5) normal (0, -1, 0) x (1, 0, 0)
  arc A0 (7, 0) -> (15, 0) centre (11, 0) ccw
  line L0 (7, 0) -> (7, 8.5)
  line L1 (8.5, 10) -> (13.5, 10)
  line L2 (15, 8.5) -> (15, 0)
  arc A1 (8.9, 0) -> (13.1, 0) centre (11, 0) ccw projected
  arc A2 (8.5, 10) -> (7, 8.5) centre (8.5, 8.5) ccw
  arc A3 (15, 8.5) -> (13.5, 10) centre (13.5, 8.5) ccw
  point P0 (21.0447, -15.5)
  point P1 (7, 10)
  dimension "d73" = 8
  dimension "d74" = 10
  dimension "d75" = 1.5
extrude "Wyciągnięcie proste9" cut sketch "Szkic6" against normal blind 1.8
chamfer "Faza1" distance 0.5 angle 45 2 edges at (-10.0447, 5.0097, 17.6) (-10.0447, -3.7903, 17.6)
equation "\"d13\" = d5"
equation "\"d58\" = 0.5 * d57"
equation "\"d59\" = 0.5 * d56"
equation "\"d60\" = d59"
equation "\"d61\" = d58"
equation "\"d9\" = d8"
properties part number "3DP_ABS_E3DV6_Mount"
